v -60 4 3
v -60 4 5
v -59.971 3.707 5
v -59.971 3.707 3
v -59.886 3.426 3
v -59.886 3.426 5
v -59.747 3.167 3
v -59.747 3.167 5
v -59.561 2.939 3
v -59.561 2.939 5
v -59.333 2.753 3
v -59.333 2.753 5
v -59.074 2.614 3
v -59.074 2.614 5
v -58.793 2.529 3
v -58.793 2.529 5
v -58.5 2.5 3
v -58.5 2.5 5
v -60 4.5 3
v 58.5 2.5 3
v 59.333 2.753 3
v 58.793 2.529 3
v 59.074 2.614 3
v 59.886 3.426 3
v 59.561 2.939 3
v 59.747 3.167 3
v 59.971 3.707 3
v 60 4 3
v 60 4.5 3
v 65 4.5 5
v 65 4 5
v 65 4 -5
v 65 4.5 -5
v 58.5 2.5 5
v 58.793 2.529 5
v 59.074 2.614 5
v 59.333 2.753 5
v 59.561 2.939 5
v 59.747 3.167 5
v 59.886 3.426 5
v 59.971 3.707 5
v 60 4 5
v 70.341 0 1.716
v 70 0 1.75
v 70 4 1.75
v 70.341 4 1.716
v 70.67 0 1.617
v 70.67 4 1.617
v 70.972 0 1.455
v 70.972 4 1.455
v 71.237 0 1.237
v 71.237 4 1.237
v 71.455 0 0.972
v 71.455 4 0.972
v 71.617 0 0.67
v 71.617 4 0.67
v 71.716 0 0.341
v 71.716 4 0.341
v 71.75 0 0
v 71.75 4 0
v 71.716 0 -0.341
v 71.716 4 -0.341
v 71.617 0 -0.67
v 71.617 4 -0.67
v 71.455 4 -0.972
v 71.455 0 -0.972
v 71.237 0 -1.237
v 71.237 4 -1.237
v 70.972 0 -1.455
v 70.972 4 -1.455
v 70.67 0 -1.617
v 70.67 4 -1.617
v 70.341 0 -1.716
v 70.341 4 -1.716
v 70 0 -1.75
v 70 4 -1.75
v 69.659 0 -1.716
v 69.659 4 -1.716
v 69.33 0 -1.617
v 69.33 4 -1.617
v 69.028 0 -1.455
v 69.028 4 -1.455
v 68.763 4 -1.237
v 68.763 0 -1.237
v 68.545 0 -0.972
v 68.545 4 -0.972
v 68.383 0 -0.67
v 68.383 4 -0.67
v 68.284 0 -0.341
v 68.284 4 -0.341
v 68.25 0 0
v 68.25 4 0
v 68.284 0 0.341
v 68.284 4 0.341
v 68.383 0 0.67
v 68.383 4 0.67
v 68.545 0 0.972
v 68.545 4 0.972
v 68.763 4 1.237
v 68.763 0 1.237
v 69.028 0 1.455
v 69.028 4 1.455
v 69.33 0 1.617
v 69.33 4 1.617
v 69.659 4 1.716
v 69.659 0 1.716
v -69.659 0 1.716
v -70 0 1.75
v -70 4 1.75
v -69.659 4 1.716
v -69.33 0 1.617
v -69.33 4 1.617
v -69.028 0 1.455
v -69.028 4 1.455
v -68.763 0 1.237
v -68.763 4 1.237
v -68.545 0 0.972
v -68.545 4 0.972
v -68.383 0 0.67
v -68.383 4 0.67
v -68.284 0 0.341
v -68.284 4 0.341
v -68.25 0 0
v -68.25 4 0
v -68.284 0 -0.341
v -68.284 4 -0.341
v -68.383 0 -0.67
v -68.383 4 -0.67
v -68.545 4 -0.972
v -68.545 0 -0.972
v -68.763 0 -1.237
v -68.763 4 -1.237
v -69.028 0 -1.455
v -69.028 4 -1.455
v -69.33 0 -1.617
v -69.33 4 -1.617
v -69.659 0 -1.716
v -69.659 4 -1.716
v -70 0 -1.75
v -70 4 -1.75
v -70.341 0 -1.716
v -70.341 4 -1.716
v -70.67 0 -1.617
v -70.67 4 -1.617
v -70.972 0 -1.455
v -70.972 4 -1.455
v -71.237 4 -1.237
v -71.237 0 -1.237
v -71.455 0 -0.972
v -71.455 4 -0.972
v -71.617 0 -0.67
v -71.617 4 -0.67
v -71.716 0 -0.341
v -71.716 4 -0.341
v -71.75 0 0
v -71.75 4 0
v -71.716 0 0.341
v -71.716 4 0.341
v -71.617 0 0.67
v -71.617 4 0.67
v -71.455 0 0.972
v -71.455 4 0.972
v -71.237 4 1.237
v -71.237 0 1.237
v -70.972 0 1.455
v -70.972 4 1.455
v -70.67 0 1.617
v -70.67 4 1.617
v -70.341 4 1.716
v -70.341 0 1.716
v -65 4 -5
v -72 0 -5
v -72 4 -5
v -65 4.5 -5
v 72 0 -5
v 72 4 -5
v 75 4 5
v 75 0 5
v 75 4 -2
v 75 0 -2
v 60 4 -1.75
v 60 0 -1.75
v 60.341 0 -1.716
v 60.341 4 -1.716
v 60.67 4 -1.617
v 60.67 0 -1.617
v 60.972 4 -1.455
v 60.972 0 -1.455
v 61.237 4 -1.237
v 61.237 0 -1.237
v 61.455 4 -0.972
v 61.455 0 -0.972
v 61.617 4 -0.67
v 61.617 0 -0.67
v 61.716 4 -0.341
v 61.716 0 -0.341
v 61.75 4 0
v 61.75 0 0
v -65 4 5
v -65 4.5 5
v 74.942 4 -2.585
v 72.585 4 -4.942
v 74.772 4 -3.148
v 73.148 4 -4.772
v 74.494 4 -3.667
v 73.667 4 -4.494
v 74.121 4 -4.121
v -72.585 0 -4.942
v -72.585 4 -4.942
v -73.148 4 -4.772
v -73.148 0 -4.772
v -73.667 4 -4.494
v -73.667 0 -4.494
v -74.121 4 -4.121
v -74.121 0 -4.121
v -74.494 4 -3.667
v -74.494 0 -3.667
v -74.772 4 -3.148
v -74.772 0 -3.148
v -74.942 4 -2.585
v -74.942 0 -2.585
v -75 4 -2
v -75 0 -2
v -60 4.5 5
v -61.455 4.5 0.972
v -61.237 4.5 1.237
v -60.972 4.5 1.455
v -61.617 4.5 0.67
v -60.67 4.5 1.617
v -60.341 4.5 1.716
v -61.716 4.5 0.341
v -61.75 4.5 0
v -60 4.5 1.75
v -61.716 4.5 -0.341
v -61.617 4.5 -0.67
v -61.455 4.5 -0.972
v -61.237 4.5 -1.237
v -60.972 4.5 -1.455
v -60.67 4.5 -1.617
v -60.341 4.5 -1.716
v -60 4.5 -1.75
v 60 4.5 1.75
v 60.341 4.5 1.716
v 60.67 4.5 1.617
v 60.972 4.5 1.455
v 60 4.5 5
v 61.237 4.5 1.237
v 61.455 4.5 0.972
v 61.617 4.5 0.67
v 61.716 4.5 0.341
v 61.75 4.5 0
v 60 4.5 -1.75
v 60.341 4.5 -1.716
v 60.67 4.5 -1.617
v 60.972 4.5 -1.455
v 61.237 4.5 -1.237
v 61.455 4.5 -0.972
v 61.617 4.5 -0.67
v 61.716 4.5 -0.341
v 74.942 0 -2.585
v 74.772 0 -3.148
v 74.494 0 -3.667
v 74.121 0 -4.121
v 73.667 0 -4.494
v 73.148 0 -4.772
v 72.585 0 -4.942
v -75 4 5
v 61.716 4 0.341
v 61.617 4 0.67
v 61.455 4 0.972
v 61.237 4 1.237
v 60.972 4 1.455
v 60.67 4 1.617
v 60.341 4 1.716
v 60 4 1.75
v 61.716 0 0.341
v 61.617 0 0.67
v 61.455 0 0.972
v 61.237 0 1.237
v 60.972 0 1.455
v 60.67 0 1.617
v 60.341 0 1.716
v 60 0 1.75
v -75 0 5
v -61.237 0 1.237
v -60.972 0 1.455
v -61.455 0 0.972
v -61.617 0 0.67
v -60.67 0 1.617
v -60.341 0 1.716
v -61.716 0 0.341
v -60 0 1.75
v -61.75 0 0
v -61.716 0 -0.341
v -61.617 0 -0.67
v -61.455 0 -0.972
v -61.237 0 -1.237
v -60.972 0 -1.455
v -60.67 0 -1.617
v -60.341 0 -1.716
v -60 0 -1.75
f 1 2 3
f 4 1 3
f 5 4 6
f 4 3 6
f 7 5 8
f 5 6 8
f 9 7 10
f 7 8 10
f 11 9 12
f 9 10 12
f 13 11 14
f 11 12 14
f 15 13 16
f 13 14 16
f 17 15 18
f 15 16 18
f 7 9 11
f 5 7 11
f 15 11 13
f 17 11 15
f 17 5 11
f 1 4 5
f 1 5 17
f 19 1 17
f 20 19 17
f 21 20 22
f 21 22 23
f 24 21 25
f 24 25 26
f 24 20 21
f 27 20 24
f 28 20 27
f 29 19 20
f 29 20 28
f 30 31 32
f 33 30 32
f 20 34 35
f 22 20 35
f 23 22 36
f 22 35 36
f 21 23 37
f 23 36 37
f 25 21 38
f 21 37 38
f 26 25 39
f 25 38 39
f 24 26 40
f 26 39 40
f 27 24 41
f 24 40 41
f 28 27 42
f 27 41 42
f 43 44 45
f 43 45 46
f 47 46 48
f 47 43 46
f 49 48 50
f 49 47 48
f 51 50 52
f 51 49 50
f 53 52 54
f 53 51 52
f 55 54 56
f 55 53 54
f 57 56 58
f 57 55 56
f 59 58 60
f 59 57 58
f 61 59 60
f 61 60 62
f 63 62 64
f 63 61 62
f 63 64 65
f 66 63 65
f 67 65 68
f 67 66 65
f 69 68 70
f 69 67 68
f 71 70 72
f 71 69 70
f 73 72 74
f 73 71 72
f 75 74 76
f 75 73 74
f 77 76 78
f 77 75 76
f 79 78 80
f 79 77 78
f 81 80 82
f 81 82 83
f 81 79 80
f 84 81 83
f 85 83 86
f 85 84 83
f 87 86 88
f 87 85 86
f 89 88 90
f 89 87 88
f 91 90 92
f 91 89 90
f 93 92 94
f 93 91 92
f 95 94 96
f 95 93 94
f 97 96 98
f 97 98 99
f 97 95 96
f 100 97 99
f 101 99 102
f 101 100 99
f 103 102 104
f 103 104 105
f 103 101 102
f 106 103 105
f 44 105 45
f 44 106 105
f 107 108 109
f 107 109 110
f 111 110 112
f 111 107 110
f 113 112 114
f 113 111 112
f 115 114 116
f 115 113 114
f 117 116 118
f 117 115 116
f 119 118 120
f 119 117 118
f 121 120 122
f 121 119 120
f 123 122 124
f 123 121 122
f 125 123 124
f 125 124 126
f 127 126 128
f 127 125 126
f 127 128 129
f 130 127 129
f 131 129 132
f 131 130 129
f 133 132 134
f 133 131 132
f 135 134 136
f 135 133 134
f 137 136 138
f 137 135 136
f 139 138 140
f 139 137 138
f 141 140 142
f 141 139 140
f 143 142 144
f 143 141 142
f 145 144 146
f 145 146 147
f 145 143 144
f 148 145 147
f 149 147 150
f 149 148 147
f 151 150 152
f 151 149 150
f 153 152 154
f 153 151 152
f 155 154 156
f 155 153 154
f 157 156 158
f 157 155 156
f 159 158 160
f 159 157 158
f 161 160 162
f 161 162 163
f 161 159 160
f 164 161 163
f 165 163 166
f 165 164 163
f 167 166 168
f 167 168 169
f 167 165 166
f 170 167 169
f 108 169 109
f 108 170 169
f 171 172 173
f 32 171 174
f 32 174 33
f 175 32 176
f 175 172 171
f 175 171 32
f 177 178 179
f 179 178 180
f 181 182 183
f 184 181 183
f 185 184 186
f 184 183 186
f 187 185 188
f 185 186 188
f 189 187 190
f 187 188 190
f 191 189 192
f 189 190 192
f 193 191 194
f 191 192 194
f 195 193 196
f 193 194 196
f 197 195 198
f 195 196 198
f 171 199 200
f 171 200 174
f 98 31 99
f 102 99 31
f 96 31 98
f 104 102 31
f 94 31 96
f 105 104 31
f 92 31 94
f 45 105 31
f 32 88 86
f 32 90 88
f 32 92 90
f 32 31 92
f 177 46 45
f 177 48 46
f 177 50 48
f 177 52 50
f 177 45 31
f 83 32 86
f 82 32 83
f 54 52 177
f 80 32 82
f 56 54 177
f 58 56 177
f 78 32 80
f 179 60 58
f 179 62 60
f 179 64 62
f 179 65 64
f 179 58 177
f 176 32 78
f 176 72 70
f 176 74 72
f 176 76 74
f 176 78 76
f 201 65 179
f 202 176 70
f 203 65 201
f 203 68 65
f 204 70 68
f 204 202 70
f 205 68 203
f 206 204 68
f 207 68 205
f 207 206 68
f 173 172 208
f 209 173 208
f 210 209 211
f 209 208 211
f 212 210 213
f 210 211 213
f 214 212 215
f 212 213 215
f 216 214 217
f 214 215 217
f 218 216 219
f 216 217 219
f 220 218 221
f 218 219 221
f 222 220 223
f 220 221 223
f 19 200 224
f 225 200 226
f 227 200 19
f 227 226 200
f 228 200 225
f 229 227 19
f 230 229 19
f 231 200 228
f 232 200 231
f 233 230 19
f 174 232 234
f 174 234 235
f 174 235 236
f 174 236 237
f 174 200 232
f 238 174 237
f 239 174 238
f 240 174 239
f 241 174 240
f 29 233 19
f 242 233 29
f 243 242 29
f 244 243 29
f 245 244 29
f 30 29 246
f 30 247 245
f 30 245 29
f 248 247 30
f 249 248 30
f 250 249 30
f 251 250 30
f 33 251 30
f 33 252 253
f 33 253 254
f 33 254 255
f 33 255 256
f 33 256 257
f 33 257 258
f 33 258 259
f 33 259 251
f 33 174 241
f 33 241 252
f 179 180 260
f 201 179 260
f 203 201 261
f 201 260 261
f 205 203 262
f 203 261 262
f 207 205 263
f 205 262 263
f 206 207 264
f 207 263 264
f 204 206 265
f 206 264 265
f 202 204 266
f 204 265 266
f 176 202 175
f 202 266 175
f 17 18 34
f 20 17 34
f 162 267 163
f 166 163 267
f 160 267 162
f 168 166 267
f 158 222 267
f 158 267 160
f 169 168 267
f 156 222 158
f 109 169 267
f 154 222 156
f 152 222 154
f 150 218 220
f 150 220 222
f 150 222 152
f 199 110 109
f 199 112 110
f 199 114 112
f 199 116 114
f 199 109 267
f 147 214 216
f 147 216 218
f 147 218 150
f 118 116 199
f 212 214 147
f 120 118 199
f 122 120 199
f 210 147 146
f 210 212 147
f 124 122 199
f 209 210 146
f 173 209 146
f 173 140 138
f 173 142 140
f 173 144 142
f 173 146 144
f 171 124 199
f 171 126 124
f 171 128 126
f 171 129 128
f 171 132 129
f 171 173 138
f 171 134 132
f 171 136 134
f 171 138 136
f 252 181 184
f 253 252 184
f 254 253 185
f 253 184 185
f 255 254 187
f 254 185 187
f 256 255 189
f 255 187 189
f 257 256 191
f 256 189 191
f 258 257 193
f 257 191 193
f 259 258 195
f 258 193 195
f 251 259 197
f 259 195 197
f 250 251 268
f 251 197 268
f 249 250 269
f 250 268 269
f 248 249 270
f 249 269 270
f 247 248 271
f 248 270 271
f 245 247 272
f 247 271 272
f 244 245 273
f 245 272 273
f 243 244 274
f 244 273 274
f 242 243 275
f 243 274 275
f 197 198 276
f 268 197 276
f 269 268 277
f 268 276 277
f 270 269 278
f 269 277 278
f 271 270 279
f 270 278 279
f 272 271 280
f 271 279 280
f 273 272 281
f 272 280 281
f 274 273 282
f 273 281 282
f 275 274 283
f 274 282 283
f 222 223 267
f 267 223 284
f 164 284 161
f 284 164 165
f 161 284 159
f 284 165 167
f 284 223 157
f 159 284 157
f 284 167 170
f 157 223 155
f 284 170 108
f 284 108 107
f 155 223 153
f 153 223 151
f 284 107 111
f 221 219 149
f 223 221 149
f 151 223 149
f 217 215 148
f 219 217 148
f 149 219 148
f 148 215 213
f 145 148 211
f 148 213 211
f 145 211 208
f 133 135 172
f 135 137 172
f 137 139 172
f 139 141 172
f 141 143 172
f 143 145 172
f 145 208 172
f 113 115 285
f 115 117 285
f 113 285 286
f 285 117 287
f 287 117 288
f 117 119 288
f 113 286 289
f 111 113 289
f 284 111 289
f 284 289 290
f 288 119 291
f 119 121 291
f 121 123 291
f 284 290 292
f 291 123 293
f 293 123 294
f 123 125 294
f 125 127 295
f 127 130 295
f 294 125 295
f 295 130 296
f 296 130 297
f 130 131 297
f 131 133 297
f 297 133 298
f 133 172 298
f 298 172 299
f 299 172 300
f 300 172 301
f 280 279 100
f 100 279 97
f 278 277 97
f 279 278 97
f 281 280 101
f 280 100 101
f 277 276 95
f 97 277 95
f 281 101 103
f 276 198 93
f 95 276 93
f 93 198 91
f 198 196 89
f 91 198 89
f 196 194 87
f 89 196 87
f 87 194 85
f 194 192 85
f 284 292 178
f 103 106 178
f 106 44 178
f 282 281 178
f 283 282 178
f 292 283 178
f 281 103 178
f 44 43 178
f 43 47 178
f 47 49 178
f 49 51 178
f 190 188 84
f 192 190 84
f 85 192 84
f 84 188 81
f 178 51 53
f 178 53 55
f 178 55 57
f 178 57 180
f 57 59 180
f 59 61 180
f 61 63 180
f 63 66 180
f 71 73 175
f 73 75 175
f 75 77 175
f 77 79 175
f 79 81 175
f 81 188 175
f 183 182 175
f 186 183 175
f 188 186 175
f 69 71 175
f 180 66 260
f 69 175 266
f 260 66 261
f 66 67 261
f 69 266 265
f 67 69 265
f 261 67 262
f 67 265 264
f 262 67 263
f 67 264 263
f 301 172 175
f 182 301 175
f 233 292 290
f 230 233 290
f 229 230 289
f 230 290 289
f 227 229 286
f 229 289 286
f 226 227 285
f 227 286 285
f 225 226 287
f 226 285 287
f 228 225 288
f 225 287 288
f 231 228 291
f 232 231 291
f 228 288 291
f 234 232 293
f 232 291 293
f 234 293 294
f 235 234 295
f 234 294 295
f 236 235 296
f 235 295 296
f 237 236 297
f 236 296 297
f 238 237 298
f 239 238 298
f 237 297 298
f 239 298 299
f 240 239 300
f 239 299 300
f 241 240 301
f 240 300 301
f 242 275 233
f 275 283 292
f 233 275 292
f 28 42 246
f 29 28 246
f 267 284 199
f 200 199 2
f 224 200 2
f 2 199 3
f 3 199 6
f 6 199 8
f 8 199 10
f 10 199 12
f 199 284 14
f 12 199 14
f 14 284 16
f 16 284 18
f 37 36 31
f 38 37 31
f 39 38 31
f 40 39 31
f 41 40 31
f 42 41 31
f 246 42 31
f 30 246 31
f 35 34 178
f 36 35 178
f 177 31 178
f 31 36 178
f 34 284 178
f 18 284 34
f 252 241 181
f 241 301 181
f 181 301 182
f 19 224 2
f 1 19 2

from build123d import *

# Parameters (mm, degrees)
SKETCH1_R           = 1.75
BOSS_EXTRUDE1_DEPTH = 4
SKETCH2_W           = 130
SKETCH2_H           = 10
BOSS_EXTRUDE2_DEPTH = 0.5
CUT_EXTRUDE1_DEPTH  = 2


with BuildPart() as part:
    # Sketch1 → Boss-Extrude1 (new body)
    with BuildSketch(Plane(origin=(0, 0, 0), x_dir=(1, 0, 0), z_dir=(0, 1, 0))):
        with BuildLine():
            ThreePointArc((75, 2), (74.121320344, 4.121320344), (72, 5))
            Line((72, 5), (-72, 5))
            ThreePointArc((-72, 5), (-74.121320344, 4.121320344), (-75, 2))
            Line((-75, 2), (-75, -5))
            Line((-75, -5), (75, -5))
            Line((75, -5), (75, 2))
        make_face()
        with Locations(Location((-70, 0, 0), (0, 0, 270))):
            Circle(SKETCH1_R, mode=Mode.SUBTRACT)
        with BuildLine():
            ThreePointArc((61.75, 0), (61.237436867, -1.237436867), (60, -1.75))
            Line((60, -1.75), (-60, -1.75))
            ThreePointArc((-60, -1.75), (-61.75, 0), (-60, 1.75))
            Line((-60, 1.75), (60, 1.75))
            ThreePointArc((60, 1.75), (61.237436867, 1.237436867), (61.75, 0))
        make_face(mode=Mode.SUBTRACT)
        with Locations(Location((70, 0, 0), (0, 0, 270))):
            Circle(SKETCH1_R, mode=Mode.SUBTRACT)
    extrude(amount=BOSS_EXTRUDE1_DEPTH)

    # Sketch2 → Boss-Extrude2 (add)
    with BuildSketch(Plane(origin=(0, 4, 0), x_dir=(1, 0, 0), z_dir=(0, 1, 0))):
        Rectangle(SKETCH2_W, SKETCH2_H)
        with BuildLine():
            Line((-60, 1.75), (60, 1.75))
            ThreePointArc((60, 1.75), (61.75, 0), (60, -1.75))
            Line((60, -1.75), (-60, -1.75))
            ThreePointArc((-60, -1.75), (-61.75, 0), (-60, 1.75))
        make_face(mode=Mode.SUBTRACT)
    extrude(amount=BOSS_EXTRUDE2_DEPTH)

    # Sketch3 → Cut-Extrude1 (cut)
    with BuildSketch(Plane.XY.offset(5)):
        with BuildLine():
            Line((-58.5, 2.5), (58.5, 2.5))
            ThreePointArc((58.5, 2.5), (59.560660172, 2.939339828), (60, 4))
            Line((60, 4), (60, 4.5))
            Line((60, 4.5), (-60, 4.5))
            Line((-60, 4.5), (-60, 4))
            ThreePointArc((-60, 4), (-59.560660172, 2.939339828), (-58.5, 2.5))
        make_face()
    extrude(amount=-CUT_EXTRUDE1_DEPTH, mode=Mode.SUBTRACT)


solid = part.part
